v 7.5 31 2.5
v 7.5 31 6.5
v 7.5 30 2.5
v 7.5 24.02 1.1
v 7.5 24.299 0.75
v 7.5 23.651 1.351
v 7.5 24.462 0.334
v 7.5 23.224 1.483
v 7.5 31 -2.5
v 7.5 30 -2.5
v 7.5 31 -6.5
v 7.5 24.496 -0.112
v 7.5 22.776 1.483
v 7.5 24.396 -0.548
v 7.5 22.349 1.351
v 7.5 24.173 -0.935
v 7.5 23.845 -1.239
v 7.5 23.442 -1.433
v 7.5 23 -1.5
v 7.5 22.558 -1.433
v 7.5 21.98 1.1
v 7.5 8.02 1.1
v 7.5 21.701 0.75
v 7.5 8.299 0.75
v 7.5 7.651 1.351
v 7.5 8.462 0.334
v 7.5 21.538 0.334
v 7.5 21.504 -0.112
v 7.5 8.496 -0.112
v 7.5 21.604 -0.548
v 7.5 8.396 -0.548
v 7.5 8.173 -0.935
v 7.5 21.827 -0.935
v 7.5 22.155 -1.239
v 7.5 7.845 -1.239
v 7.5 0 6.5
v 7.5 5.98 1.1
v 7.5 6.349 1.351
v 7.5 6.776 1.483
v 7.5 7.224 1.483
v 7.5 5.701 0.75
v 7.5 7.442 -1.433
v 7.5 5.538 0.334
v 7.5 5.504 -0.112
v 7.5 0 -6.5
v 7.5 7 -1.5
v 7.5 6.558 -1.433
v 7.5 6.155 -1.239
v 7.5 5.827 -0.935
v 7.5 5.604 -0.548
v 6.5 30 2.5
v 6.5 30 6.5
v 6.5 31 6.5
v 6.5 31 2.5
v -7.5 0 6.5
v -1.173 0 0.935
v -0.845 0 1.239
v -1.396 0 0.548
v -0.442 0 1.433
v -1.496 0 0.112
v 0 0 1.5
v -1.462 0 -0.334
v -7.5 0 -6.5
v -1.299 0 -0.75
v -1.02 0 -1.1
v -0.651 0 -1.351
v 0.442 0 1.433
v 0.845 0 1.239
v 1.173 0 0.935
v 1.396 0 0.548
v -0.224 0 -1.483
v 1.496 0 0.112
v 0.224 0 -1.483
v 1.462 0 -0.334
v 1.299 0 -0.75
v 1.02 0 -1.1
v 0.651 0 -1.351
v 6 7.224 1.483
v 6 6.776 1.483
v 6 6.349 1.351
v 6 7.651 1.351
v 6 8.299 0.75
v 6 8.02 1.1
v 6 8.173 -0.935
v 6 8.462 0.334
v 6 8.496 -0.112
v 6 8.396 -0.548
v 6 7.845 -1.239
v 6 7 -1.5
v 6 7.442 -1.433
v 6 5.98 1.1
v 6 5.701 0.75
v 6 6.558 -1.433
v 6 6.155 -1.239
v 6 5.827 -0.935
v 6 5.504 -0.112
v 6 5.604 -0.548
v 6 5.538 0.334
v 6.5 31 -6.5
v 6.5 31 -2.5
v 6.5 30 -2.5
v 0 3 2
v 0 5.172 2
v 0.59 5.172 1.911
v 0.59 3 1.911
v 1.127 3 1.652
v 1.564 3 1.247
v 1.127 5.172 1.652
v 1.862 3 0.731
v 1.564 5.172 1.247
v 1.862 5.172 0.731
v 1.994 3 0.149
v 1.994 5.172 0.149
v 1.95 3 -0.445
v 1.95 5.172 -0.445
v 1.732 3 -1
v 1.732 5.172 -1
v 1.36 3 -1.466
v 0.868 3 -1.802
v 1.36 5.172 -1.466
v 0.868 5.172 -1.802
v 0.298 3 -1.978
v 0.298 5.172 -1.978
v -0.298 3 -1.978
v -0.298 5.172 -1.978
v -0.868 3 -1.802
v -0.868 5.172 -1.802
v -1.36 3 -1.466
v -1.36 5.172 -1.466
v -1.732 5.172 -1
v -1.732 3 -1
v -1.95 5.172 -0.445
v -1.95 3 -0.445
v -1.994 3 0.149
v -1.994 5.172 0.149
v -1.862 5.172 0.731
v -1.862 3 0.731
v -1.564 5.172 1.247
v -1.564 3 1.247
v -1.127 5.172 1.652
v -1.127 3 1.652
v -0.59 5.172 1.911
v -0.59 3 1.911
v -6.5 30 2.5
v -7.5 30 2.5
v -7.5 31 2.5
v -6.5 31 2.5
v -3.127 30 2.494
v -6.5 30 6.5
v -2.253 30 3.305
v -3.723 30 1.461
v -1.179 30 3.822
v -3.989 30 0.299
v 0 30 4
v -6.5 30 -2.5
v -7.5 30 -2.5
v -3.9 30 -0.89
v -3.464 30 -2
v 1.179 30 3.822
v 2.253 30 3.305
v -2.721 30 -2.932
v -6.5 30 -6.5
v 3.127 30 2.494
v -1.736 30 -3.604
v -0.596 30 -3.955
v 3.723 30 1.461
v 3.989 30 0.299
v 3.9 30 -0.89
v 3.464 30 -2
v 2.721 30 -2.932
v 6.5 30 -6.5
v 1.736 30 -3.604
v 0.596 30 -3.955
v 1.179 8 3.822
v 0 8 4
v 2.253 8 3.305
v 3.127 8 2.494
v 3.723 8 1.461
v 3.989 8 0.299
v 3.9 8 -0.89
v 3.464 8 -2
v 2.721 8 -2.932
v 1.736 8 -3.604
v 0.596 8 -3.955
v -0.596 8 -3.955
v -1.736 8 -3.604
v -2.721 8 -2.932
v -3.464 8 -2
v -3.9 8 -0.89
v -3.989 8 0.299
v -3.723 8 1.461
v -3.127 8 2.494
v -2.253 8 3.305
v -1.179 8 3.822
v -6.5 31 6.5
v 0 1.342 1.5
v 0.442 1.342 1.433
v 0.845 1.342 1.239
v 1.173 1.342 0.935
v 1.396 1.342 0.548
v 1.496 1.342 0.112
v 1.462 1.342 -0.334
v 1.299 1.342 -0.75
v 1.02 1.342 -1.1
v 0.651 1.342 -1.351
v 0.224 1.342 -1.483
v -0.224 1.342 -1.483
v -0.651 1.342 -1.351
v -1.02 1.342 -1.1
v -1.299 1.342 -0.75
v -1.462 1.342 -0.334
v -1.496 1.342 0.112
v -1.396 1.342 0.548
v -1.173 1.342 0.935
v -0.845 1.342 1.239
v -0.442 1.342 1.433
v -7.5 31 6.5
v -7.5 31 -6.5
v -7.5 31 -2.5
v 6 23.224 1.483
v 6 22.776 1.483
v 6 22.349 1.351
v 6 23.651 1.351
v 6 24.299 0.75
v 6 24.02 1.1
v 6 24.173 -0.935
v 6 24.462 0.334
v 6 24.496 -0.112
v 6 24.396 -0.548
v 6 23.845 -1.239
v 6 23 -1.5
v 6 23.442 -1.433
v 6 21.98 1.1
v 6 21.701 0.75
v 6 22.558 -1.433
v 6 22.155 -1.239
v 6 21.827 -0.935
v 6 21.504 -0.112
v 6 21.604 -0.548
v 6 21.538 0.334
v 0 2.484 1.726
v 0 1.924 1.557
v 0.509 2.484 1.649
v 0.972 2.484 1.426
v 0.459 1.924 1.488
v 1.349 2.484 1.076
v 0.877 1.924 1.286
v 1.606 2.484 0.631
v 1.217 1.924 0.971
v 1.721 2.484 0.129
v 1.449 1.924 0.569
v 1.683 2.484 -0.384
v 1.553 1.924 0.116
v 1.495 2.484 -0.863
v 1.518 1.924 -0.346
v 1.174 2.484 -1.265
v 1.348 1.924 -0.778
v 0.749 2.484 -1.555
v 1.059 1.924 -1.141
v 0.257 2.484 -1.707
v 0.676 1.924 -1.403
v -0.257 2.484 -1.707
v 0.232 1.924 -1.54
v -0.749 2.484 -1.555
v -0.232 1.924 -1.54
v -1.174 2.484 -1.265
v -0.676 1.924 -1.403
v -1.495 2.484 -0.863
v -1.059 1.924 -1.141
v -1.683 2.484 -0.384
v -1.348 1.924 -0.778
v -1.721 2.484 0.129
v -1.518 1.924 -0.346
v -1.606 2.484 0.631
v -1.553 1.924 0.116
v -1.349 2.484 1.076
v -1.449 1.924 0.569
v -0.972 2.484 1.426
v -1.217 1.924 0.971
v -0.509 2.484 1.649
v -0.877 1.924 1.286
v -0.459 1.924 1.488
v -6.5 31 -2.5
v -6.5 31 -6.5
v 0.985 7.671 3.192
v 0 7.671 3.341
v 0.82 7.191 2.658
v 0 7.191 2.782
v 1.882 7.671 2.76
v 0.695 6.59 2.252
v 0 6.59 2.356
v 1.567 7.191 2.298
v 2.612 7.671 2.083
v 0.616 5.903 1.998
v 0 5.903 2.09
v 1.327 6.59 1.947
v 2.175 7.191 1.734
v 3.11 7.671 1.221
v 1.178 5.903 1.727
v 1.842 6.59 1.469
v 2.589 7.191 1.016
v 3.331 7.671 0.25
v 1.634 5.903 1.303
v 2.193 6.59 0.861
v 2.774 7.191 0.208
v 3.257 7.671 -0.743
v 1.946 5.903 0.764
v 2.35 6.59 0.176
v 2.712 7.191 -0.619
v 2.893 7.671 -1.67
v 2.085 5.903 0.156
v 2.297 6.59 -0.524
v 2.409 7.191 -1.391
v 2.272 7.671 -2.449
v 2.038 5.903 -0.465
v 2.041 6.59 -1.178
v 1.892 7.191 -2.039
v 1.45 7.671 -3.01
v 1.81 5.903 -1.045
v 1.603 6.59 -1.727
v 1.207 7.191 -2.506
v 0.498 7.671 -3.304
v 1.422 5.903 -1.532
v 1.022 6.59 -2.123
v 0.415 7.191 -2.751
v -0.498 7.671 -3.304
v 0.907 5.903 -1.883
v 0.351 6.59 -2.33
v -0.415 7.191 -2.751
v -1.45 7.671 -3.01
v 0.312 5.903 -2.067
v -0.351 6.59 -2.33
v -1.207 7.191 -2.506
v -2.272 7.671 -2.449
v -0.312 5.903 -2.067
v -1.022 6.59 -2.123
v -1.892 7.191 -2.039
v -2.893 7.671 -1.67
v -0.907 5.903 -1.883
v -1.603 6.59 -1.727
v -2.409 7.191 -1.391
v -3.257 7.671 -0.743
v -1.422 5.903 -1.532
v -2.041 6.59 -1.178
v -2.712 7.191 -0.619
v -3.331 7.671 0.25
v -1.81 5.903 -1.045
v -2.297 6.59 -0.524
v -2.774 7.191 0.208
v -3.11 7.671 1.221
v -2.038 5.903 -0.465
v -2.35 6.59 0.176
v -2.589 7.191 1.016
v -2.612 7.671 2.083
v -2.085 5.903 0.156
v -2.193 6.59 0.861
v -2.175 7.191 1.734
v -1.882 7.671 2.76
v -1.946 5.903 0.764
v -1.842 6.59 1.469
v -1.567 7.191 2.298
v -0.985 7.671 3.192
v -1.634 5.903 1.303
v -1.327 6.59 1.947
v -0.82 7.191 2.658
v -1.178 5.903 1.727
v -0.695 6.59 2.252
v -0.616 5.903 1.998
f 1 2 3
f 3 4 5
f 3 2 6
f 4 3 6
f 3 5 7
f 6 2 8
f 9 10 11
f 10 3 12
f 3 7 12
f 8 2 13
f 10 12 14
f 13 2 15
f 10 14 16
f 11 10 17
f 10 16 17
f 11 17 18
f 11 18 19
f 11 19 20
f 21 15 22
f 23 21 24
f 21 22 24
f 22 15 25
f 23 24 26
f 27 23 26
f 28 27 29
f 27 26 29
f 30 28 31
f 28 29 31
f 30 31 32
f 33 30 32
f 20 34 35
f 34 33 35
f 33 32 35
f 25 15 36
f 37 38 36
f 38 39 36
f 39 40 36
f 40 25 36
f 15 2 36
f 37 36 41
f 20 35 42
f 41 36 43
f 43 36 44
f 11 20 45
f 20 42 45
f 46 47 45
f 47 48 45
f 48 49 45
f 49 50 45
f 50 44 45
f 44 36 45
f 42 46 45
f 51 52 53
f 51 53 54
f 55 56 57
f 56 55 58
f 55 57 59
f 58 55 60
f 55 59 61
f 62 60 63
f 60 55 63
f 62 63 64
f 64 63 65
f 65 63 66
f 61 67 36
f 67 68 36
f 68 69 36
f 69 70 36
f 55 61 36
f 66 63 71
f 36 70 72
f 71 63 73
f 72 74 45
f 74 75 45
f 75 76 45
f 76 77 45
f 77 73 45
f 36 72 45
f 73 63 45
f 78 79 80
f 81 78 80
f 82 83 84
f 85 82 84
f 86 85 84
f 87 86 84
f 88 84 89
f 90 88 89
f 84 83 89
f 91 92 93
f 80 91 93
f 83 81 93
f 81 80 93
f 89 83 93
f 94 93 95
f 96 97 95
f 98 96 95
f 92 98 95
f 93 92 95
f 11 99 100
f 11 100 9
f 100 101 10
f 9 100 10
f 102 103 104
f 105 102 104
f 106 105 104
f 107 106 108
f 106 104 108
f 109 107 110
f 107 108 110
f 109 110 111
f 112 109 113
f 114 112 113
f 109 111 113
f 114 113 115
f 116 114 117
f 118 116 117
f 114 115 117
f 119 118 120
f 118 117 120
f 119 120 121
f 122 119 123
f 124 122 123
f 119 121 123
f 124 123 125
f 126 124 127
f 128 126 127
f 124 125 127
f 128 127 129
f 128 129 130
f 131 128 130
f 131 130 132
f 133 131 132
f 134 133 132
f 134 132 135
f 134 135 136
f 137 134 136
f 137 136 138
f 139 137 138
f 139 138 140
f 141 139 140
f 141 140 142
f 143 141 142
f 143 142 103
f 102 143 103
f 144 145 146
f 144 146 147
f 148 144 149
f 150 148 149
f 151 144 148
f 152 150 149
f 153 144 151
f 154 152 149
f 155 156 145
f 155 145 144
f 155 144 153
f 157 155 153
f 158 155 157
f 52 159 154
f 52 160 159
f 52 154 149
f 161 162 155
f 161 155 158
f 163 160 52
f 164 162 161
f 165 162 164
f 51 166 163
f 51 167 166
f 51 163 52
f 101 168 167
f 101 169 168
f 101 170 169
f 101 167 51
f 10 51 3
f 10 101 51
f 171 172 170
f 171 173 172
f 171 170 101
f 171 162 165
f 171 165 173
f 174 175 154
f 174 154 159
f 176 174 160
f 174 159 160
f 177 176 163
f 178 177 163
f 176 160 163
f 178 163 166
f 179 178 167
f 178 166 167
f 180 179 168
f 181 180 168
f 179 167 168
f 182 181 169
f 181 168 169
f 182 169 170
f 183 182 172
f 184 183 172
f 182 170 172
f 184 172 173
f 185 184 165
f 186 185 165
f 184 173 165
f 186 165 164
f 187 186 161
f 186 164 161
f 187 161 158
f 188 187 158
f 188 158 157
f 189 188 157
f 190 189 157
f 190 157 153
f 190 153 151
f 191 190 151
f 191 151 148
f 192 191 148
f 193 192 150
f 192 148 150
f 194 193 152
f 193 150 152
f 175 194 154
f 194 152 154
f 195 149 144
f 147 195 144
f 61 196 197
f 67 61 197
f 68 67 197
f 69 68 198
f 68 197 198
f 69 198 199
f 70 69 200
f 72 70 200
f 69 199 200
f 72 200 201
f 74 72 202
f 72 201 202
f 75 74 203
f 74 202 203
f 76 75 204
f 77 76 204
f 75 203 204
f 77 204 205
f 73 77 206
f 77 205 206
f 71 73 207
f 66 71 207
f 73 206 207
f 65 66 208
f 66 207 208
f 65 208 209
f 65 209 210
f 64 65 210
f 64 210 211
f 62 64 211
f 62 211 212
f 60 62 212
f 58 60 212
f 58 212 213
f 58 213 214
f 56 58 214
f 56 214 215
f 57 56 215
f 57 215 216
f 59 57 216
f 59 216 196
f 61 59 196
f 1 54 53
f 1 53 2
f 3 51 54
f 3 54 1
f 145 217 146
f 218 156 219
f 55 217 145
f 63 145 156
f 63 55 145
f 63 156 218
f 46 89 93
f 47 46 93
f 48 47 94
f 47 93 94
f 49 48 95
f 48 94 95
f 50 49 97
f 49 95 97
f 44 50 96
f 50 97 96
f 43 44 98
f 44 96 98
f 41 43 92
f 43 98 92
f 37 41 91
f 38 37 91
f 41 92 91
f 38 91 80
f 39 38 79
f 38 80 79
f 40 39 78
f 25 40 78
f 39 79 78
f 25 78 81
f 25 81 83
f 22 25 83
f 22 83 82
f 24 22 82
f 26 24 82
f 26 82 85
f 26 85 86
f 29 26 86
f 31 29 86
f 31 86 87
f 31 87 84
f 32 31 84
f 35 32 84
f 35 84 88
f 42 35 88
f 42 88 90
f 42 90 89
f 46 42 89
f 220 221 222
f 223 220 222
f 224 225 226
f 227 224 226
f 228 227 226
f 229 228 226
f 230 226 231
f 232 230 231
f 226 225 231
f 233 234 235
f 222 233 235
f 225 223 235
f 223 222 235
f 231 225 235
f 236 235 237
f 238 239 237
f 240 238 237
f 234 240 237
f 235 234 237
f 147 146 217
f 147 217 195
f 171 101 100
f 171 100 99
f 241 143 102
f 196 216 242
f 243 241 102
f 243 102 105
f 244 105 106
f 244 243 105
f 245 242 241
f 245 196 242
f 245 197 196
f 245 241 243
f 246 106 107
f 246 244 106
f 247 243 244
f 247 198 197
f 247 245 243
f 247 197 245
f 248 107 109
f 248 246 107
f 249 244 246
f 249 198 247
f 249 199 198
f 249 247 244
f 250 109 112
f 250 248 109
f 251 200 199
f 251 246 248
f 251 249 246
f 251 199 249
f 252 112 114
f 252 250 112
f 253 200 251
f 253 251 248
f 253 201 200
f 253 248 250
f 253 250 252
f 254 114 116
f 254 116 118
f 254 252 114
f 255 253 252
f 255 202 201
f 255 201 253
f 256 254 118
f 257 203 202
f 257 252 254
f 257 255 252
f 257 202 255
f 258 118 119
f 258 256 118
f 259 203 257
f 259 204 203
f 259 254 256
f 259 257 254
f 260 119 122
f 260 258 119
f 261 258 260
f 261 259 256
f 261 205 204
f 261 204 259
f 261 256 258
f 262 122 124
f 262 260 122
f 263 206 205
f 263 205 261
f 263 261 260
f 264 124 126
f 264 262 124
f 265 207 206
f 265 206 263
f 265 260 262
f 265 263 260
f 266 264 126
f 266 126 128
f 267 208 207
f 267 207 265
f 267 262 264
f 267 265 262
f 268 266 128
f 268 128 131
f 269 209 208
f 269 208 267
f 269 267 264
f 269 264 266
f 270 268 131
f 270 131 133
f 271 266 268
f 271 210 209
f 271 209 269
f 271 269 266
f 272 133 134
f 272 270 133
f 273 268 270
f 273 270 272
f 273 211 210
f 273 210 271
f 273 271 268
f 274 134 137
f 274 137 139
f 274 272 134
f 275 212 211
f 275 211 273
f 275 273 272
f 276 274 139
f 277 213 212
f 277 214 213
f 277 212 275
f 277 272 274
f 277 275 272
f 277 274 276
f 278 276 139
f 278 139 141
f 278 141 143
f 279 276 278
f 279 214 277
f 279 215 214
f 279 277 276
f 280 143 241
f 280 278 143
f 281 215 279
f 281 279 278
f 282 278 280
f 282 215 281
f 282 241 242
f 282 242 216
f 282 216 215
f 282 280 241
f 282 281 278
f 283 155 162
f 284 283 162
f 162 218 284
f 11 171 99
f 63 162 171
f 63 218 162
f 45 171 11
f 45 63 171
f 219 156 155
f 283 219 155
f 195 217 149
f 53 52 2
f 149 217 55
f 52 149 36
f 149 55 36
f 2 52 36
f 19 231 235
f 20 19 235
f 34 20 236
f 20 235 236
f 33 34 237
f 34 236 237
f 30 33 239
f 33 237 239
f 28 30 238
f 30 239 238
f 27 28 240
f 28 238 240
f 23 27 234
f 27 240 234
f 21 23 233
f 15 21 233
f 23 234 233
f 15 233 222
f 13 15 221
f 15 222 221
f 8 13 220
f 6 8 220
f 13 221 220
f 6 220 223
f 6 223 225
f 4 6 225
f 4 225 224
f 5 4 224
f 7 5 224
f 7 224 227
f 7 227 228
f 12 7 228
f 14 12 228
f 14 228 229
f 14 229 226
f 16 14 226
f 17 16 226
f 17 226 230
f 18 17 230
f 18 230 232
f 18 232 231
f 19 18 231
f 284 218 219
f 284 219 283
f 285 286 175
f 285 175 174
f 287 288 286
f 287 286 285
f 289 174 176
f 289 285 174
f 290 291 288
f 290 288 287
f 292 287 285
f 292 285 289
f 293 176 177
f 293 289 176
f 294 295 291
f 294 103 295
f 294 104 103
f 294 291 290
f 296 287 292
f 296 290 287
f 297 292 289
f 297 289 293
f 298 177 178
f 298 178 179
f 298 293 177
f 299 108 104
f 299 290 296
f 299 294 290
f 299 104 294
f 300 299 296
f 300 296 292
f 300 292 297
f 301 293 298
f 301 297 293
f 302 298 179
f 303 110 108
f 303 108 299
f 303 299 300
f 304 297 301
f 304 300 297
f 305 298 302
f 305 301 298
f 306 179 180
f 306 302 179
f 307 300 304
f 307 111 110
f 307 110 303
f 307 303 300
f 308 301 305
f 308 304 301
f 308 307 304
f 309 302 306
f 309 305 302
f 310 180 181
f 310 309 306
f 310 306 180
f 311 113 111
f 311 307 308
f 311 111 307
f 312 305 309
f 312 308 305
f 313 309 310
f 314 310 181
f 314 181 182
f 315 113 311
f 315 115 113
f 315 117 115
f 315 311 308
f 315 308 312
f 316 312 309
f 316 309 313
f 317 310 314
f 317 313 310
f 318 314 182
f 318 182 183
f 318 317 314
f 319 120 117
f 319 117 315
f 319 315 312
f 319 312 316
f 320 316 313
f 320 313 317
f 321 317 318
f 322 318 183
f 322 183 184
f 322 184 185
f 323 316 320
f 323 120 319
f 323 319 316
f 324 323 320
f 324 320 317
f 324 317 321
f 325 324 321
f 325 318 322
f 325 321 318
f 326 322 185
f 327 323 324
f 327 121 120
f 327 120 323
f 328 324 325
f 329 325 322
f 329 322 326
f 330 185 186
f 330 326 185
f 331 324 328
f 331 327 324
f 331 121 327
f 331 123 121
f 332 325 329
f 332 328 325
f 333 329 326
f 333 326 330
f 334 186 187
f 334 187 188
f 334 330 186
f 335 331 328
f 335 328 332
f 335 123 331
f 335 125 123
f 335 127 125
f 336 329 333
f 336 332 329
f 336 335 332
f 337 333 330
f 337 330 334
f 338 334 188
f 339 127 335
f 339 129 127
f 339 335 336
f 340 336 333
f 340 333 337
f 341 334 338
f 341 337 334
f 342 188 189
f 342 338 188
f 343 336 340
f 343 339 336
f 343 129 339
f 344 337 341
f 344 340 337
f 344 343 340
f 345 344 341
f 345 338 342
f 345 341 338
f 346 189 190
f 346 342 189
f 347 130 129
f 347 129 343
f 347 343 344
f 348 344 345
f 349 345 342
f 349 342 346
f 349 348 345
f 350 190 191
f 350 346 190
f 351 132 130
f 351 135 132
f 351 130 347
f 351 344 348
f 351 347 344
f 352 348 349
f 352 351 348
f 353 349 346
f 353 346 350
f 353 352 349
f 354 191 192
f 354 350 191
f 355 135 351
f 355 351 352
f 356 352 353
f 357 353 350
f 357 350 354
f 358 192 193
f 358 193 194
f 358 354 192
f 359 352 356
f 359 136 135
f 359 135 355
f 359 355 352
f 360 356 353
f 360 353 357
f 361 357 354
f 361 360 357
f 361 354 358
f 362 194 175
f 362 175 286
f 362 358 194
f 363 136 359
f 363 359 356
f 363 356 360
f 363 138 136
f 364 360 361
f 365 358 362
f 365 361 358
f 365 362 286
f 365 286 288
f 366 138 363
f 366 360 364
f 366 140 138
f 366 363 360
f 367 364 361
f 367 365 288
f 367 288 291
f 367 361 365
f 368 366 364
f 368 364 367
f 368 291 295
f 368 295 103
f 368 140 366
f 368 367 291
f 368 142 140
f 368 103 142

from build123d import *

# Parameters (mm, degrees)
SKETCH2_W                    = 15
SKETCH2_H                    = 13
BOSS_EXTRUDE1_DEPTH          = 30
SKETCH3_W                    = 1
SKETCH3_H                    = 4
BOSS_EXTRUDE2_DEPTH          = 1
SKETCH4_R                    = 4
CUT_EXTRUDE3_DEPTH           = 22
SKETCH5_R                    = 2
CUT_EXTRUDE4_DEPTH           = 5
SKETCH7_R                    = 1.5
CUT_EXTRUDE5_DEPTH           = 30.706901555
FILLET4_R                    = 3
FILLET5_R                    = 3
F_8_0_3_DIAMETER_HOLE1_D     = 3
F_8_0_3_DIAMETER_HOLE1_DEPTH = 1.5


with BuildPart() as part:
    # Sketch2 → Boss-Extrude1 (new body)
    with BuildSketch(Plane(origin=(0, 0, 0), x_dir=(1, 0, 0), z_dir=(0, 1, 0))):
        Rectangle(SKETCH2_W, SKETCH2_H)
    extrude(amount=BOSS_EXTRUDE1_DEPTH)

    # Sketch3 → Boss-Extrude2 (add)
    with BuildSketch(Plane(origin=(0, 30, 0), x_dir=(1, 0, 0), z_dir=(0, 1, 0))):
        with Locations((7, 4.5)):
            Rectangle(SKETCH3_W, SKETCH3_H)
        with Locations((7, -4.5)):
            Rectangle(SKETCH3_W, SKETCH3_H)
        with Locations((-7, -4.5)):
            Rectangle(SKETCH3_W, SKETCH3_H)
        with Locations((-7, 4.5)):
            Rectangle(SKETCH3_W, SKETCH3_H)
    extrude(amount=BOSS_EXTRUDE2_DEPTH)

    # Sketch4 → Cut-Extrude3 (cut)
    with BuildSketch(Plane(origin=(0, 30, 0), x_dir=(1, 0, 0), z_dir=(0, 1, 0))):
        with Locations(Location((0, 0, 0), (0, 0, 270))):
            Circle(SKETCH4_R)
    extrude(amount=-CUT_EXTRUDE3_DEPTH, mode=Mode.SUBTRACT)

    # Sketch5 → Cut-Extrude4 (cut)
    with BuildSketch(Plane(origin=(0, 8, 0), x_dir=(1, 0, 0), z_dir=(0, 1, 0))):
        with Locations(Location((0, 0, 0), (0, 0, 270))):
            Circle(SKETCH5_R)
    extrude(amount=-CUT_EXTRUDE4_DEPTH, mode=Mode.SUBTRACT)

    # Sketch7 → Cut-Extrude5 (cut, through all)
    with BuildSketch(Plane(origin=(0, 3, 0), x_dir=(1, 0, 0), z_dir=(0, 1, 0))):
        with Locations(Location((0, 0, 0), (0, 0, 270))):
            Circle(SKETCH7_R)
    extrude(amount=-CUT_EXTRUDE5_DEPTH, mode=Mode.SUBTRACT)

    # Fillet4
    # the kernel refuses this fillet: 3 mm, written as the material it takes off along each edge
    with BuildSketch(Plane(origin=(0, 8, 0), x_dir=(0, 0, 1), z_dir=(-1, 0, 0))) as fillet4_piece_1:
        with BuildLine():
            CenterArc((5, -2.828427125), FILLET4_R, 109.471220634, 70.528779366)
            Line((2, -2.828427125), (1.94, -2.828427125))
            Line((1.94, -2.828427125), (1.94, 0))
            Line((1.94, 0), (2, 0.06))
            ThreePointArc((2, 0.06), (3, 0.06), (3.98, 0.056568542))
            Line((3.98, 0.056568542), (4, 0))
        make_face()
    revolve(axis=Axis((0, 8, 0), (0, 1, 0)), mode=Mode.SUBTRACT)

    # Fillet5
    # the kernel refuses this fillet: 3 mm, written as the material it takes off along each edge
    with BuildSketch(Plane(origin=(0, 3, 0), x_dir=(0, 0, 1), z_dir=(-1, 0, 0))) as fillet5_piece_1:
        with BuildLine():
            CenterArc((4.5, -1.658312395), FILLET5_R, 146.442690238, 33.557309762)
            Line((2, 0), (1.95, 0.033166248))
            ThreePointArc((1.95, 0.033166248), (1.75, 0.06), (1.5, 0.06))
            Line((1.5, 0.06), (1.44, 0))
            Line((1.44, 0), (1.44, -1.658312395))
            Line((1.44, -1.658312395), (1.5, -1.658312395))
        make_face()
    revolve(axis=Axis((0, 3, 0), (0, 1, 0)), mode=Mode.SUBTRACT)

    # Ø8.0 (3) Diameter Hole1
    with Locations(Plane(origin=(7.5, 7, 0), x_dir=(0, 0, 1), z_dir=(1, 0, 0))):
        with Locations((0, 0), (0, -16)):
            Hole(F_8_0_3_DIAMETER_HOLE1_D / 2, depth=F_8_0_3_DIAMETER_HOLE1_DEPTH)


solid = part.part
